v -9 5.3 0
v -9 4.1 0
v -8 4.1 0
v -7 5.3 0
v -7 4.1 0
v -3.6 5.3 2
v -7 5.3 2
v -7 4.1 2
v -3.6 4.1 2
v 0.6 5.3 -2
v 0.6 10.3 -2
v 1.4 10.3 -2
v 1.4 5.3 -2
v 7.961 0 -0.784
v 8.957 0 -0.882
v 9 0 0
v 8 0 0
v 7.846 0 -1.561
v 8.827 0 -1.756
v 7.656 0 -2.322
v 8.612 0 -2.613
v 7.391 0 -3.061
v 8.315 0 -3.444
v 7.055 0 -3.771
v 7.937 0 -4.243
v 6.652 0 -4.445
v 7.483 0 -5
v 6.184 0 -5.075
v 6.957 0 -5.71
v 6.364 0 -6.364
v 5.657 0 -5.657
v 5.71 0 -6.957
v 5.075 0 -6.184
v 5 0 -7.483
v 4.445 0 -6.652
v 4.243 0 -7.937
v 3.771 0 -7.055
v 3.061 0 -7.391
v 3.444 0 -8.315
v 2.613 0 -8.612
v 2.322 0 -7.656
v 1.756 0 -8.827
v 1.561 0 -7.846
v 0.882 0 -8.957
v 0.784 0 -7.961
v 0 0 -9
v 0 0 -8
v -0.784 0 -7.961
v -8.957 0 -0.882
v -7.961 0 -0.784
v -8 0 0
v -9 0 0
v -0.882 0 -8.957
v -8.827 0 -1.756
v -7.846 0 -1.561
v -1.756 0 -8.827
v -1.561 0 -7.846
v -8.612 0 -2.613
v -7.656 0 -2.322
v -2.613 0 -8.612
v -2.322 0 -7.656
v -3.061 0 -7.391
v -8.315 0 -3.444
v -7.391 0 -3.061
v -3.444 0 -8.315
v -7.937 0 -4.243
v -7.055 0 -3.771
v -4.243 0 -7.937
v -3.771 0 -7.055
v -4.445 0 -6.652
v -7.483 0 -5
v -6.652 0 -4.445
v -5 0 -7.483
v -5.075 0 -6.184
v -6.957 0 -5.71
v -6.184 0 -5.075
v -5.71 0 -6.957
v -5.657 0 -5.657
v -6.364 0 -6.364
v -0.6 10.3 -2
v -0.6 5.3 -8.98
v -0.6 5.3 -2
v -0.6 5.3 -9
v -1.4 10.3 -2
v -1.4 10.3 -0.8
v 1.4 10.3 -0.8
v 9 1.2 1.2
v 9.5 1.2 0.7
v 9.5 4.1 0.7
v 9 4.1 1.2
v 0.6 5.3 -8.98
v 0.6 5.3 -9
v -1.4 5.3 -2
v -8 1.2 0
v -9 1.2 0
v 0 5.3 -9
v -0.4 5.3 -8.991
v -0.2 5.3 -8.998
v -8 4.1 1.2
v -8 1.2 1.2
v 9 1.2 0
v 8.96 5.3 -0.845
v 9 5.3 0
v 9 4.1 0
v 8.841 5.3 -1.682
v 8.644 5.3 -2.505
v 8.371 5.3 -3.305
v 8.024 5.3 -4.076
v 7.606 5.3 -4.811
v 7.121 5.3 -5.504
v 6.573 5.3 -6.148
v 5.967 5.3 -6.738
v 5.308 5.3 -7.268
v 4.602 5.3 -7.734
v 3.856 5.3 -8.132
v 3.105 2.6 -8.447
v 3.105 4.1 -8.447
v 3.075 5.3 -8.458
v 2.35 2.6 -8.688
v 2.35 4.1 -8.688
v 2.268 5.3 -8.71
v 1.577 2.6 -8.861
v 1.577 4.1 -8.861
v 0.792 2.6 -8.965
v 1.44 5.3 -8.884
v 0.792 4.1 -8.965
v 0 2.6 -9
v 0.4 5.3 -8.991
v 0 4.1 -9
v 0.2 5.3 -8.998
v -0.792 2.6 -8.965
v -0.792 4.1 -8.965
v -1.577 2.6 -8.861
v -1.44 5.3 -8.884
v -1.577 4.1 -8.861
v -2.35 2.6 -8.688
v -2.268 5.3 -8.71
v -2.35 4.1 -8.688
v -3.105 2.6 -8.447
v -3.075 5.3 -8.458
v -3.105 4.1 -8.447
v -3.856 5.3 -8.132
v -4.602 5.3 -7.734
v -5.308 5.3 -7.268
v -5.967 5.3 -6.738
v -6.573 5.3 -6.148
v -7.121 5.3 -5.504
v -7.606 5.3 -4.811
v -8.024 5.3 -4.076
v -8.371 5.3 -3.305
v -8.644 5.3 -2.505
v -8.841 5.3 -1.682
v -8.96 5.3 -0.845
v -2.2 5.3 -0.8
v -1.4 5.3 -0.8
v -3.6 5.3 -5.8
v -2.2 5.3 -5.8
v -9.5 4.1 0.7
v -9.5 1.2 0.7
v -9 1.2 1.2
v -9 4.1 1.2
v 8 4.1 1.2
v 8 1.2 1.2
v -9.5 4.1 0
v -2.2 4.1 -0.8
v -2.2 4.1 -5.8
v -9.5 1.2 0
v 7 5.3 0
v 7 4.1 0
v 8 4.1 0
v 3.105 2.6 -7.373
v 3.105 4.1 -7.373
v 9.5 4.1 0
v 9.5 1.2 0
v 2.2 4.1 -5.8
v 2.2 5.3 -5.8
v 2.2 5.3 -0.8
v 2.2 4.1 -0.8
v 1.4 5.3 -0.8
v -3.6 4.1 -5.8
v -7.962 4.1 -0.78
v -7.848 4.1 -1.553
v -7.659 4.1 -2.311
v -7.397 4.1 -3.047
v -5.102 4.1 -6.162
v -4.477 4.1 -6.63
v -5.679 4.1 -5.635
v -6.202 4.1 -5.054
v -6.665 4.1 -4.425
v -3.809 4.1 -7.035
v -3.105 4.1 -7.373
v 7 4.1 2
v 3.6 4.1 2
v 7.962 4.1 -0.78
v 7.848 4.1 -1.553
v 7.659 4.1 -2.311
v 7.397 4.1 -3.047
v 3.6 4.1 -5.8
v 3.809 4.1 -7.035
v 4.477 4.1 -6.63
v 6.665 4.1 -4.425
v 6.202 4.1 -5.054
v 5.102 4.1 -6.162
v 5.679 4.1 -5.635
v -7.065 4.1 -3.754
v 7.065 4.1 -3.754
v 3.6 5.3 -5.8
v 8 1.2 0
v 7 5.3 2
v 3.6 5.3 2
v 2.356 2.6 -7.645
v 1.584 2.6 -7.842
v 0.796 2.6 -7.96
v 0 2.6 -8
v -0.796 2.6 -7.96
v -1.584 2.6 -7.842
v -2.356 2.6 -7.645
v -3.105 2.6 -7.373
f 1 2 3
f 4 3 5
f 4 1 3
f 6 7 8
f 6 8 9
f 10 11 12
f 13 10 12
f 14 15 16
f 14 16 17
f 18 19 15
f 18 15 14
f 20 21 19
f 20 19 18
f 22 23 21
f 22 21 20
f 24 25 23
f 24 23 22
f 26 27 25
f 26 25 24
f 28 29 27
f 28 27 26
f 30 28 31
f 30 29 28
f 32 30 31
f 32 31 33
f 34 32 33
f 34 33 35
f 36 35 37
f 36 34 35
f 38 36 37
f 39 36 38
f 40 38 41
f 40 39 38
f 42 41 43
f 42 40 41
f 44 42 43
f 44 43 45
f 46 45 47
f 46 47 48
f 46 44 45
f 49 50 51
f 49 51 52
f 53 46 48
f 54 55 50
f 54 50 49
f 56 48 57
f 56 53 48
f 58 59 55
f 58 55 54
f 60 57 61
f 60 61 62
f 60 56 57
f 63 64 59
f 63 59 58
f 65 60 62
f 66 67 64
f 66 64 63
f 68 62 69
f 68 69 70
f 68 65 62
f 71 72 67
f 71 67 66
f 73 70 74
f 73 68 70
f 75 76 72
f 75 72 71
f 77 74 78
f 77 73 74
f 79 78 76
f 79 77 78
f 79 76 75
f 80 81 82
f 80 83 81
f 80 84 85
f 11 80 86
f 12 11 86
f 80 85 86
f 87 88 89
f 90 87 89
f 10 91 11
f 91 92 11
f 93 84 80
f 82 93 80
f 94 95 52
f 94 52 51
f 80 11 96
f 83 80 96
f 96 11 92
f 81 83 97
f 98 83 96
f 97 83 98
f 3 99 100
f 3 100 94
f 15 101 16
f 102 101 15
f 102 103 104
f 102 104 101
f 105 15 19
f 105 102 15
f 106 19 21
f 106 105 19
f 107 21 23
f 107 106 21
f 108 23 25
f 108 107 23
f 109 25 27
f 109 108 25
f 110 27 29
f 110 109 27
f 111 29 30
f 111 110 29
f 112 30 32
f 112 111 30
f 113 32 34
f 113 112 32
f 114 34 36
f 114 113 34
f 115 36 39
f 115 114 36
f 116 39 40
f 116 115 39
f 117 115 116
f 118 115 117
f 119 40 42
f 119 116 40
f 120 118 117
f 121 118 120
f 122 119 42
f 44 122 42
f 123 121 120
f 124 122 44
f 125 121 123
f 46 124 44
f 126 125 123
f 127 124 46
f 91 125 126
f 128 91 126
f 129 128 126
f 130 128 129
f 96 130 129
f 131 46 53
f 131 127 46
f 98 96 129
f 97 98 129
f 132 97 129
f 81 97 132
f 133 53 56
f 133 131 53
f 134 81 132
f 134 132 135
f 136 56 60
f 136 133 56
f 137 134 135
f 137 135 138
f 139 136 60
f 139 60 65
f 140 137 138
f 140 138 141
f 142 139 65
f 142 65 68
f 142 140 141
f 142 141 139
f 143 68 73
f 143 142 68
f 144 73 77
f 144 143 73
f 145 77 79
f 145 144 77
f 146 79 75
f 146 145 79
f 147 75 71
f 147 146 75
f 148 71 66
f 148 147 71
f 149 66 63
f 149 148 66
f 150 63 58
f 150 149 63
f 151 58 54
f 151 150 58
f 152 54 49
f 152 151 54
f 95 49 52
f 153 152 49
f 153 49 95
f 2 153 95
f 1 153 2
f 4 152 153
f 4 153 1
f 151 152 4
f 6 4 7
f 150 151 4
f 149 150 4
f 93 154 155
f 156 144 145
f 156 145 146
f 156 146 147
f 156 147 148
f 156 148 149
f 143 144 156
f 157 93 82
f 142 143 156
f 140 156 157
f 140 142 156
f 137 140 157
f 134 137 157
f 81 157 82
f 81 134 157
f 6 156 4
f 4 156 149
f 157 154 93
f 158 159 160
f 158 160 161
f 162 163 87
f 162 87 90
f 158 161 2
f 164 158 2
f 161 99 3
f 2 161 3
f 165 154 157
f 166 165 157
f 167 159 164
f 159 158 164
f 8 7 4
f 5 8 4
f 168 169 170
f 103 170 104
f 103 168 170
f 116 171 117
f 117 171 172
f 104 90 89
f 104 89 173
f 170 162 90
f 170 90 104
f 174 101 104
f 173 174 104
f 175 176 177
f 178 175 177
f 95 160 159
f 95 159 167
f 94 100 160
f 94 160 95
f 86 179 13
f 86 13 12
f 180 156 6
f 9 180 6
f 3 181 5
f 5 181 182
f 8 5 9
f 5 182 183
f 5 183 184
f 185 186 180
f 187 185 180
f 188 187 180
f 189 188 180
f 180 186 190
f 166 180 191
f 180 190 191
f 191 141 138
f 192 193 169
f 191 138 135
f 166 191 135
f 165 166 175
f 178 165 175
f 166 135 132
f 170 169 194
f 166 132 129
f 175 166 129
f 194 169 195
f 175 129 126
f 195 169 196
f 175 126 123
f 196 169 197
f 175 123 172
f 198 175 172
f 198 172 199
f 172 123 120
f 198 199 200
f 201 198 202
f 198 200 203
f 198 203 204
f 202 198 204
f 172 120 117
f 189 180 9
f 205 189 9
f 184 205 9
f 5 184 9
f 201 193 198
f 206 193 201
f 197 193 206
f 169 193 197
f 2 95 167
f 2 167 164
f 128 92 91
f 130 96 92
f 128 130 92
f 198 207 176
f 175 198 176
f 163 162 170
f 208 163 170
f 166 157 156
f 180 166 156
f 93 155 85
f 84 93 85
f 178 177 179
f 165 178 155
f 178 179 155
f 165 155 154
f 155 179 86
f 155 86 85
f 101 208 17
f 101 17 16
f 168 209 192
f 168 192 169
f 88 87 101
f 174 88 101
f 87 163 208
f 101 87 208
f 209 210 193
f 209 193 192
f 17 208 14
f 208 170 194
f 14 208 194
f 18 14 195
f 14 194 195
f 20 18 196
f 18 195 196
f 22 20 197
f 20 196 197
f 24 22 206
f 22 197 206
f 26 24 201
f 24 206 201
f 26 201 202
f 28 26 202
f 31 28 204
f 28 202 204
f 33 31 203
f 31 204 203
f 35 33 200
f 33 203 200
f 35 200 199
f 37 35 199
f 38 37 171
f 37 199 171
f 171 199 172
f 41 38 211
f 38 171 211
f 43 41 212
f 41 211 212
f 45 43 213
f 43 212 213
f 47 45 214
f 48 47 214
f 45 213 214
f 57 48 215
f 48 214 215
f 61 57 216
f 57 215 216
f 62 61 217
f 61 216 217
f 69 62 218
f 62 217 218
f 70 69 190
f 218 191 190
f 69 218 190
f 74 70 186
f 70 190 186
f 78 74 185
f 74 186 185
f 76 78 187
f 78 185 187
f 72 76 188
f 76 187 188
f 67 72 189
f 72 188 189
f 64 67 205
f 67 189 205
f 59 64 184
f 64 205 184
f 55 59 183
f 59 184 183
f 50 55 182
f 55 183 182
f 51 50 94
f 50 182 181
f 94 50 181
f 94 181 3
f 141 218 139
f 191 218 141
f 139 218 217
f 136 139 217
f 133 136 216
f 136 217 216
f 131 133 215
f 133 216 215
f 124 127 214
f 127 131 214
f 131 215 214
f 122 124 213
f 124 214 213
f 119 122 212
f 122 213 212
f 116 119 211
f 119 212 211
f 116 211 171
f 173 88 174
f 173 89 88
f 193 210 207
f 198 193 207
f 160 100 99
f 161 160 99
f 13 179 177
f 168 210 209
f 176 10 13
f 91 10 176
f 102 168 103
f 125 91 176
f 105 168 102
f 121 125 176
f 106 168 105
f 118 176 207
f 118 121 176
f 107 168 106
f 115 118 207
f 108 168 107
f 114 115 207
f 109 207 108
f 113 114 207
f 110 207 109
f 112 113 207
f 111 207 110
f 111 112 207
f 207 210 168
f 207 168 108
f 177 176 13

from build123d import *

# Parameters (mm, degrees)
SKETCH1_W                = 8
SKETCH1_H                = 1.2
SKETCH1_W_2              = 1
SKETCH1_H_2              = 4.1
REVOLVE1_ANGLE           = 180
SKETCH2_W                = 6.21
SKETCH2_H                = 1.5
CUT_EXTRUDE1_DEPTH       = 14.787313009
CUT_EXTRUDE2_DEPTH       = 14.787313009
SKETCH4_W                = 3.4
SKETCH4_H                = 2
BOSS_EXTRUDE1_DEPTH      = 1.2
SKETCH5_W                = 1.2
SKETCH5_H                = 2.9
BOSS_EXTRUDE2_DEPTH      = 1.5
CHAMFER1_SIZE            = 0.5
CHAMFER1_OF_MIRROR2_SIZE = 0.5
SKETCH6_W                = 2.8
SKETCH6_H                = 5
BOSS_EXTRUDE3_DEPTH      = 1.2
BOSS_EXTRUDE4_DEPTH      = 0.6


with BuildPart() as part:
    # Sketch1 → Revolve1 (revolve)
    with BuildSketch(Plane.XY):
        with Locations((4, 4.7)):
            Rectangle(SKETCH1_W, SKETCH1_H)
        with Locations((8.5, 4.7)):
            Rectangle(SKETCH1_W_2, SKETCH1_H)
        with Locations((8.5, 2.05)):
            Rectangle(SKETCH1_W_2, SKETCH1_H_2)
    revolve(axis=Axis((0, 0, 0), (0, 1, 0)), revolution_arc=REVOLVE1_ANGLE)

    # Sketch2 → Cut-Extrude1 (cut, through all)
    with BuildSketch(Plane.XY):
        with Locations((0, 3.35)):
            Rectangle(SKETCH2_W, SKETCH2_H)
    extrude(amount=-CUT_EXTRUDE1_DEPTH, mode=Mode.SUBTRACT)

    # Sketch3 → Cut-Extrude2 (cut, through all)
    with BuildSketch(Plane(origin=(0, 5.3, 0), x_dir=(1, 0, 0), z_dir=(0, 1, 0))):
        Polygon((-2.2, 5.8), (-3.6, 5.8), (-3.6, 0), (3.6, 0), (3.6, 5.8), (2.2, 5.8), (2.2, 0.8), (-2.2, 0.8), align=None)
    extrude(amount=-CUT_EXTRUDE2_DEPTH, mode=Mode.SUBTRACT)

    # Sketch4 → Boss-Extrude1 (add)
    with BuildSketch(Plane(origin=(0, 5.3, 0), x_dir=(1, 0, 0), z_dir=(0, 1, 0))):
        with Locations((5.3, -1)):
            Rectangle(SKETCH4_W, SKETCH4_H)
        with Locations((-5.3, -1)):
            Rectangle(SKETCH4_W, SKETCH4_H)
    extrude(amount=-BOSS_EXTRUDE1_DEPTH)

    # Sketch5 → Boss-Extrude2 (add)
    with BuildSketch(Plane(origin=(8, 0, 0), x_dir=(0, 0, -1), z_dir=(1, 0, 0))):
        with Locations((-0.6, 2.65)):
            Rectangle(SKETCH5_W, SKETCH5_H)
    boss_extrude2 = extrude(amount=BOSS_EXTRUDE2_DEPTH)

    # Chamfer1
    chamfer1_edges = [part.edges().sort_by_distance(p)[0] for p in [
        (9.5, 2.65, 1.2),
    ]]
    chamfer(chamfer1_edges, length=CHAMFER1_SIZE)

    # Mirror2: Boss-Extrude2 across plane
    add(boss_extrude2.mirror(Plane(origin=(0, 0, 0), x_dir=(0, 0, 1), z_dir=(1, 0, 0))))

    # Chamfer1 of Mirror2
    chamfer1_of_mirror2_edges = [part.edges().sort_by_distance(p)[0] for p in [
        (-9.5, 2.65, 1.2),
    ]]
    chamfer(chamfer1_of_mirror2_edges, length=CHAMFER1_OF_MIRROR2_SIZE)

    # Sketch6 → Boss-Extrude3 (add)
    with BuildSketch(Plane.XY.offset(-0.8)):
        with Locations((0, 7.8)):
            Rectangle(SKETCH6_W, SKETCH6_H)
    extrude(amount=-BOSS_EXTRUDE3_DEPTH)

    # Sketch7 → Boss-Extrude4 (add, symmetric)
    with BuildSketch(Plane(origin=(0, 0, 0), x_dir=(0, 0, -1), z_dir=(1, 0, 0))):
        Polygon((2, 10.3), (9, 5.3), (2, 5.3), align=None)
    extrude(amount=BOSS_EXTRUDE4_DEPTH, both=True)


solid = part.part
